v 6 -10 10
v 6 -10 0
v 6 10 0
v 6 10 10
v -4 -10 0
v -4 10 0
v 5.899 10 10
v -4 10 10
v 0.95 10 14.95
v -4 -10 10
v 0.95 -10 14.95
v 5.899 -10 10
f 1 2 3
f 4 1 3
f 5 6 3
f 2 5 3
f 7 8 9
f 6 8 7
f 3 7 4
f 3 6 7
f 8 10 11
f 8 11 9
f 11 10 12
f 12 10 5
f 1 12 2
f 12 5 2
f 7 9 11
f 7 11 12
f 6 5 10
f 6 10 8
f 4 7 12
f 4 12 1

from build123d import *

# Parameters (mm, degrees)
BOX001_W               = 7
BOX001_H               = 20
BOX001_DEPTH           = 7
BOX001_PLACEMENT_ANGLE = 45
BOX_W                  = 10
BOX_H                  = 20
BOX_DEPTH              = 10


with BuildPart() as cub001:
    # Box001 → Box001 (new body)
    with BuildSketch(Plane.XY):
        with Locations((3.5, 10)):
            Rectangle(BOX001_W, BOX001_H)
    extrude(amount=BOX001_DEPTH)


with BuildPart() as cub001_1:
    # Box001 placement: moved
    add(cub001.part.moved(Location((0, 0, 10))).rotate(Axis((0, 0, 10), (0, 1, 0)), BOX001_PLACEMENT_ANGLE))


with BuildPart() as fusion:
    # Box → Box (new body)
    with BuildSketch(Plane.XY):
        with Locations((5, 10)):
            Rectangle(BOX_W, BOX_H)
    extrude(amount=BOX_DEPTH)

    # Fusion: union Cub001
    add(cub001_1.part)


with BuildPart() as fusion_1:
    # Fusion placement: moved
    add(fusion.part.moved(Location((-4, -10, 0))))


solid = fusion_1.part
